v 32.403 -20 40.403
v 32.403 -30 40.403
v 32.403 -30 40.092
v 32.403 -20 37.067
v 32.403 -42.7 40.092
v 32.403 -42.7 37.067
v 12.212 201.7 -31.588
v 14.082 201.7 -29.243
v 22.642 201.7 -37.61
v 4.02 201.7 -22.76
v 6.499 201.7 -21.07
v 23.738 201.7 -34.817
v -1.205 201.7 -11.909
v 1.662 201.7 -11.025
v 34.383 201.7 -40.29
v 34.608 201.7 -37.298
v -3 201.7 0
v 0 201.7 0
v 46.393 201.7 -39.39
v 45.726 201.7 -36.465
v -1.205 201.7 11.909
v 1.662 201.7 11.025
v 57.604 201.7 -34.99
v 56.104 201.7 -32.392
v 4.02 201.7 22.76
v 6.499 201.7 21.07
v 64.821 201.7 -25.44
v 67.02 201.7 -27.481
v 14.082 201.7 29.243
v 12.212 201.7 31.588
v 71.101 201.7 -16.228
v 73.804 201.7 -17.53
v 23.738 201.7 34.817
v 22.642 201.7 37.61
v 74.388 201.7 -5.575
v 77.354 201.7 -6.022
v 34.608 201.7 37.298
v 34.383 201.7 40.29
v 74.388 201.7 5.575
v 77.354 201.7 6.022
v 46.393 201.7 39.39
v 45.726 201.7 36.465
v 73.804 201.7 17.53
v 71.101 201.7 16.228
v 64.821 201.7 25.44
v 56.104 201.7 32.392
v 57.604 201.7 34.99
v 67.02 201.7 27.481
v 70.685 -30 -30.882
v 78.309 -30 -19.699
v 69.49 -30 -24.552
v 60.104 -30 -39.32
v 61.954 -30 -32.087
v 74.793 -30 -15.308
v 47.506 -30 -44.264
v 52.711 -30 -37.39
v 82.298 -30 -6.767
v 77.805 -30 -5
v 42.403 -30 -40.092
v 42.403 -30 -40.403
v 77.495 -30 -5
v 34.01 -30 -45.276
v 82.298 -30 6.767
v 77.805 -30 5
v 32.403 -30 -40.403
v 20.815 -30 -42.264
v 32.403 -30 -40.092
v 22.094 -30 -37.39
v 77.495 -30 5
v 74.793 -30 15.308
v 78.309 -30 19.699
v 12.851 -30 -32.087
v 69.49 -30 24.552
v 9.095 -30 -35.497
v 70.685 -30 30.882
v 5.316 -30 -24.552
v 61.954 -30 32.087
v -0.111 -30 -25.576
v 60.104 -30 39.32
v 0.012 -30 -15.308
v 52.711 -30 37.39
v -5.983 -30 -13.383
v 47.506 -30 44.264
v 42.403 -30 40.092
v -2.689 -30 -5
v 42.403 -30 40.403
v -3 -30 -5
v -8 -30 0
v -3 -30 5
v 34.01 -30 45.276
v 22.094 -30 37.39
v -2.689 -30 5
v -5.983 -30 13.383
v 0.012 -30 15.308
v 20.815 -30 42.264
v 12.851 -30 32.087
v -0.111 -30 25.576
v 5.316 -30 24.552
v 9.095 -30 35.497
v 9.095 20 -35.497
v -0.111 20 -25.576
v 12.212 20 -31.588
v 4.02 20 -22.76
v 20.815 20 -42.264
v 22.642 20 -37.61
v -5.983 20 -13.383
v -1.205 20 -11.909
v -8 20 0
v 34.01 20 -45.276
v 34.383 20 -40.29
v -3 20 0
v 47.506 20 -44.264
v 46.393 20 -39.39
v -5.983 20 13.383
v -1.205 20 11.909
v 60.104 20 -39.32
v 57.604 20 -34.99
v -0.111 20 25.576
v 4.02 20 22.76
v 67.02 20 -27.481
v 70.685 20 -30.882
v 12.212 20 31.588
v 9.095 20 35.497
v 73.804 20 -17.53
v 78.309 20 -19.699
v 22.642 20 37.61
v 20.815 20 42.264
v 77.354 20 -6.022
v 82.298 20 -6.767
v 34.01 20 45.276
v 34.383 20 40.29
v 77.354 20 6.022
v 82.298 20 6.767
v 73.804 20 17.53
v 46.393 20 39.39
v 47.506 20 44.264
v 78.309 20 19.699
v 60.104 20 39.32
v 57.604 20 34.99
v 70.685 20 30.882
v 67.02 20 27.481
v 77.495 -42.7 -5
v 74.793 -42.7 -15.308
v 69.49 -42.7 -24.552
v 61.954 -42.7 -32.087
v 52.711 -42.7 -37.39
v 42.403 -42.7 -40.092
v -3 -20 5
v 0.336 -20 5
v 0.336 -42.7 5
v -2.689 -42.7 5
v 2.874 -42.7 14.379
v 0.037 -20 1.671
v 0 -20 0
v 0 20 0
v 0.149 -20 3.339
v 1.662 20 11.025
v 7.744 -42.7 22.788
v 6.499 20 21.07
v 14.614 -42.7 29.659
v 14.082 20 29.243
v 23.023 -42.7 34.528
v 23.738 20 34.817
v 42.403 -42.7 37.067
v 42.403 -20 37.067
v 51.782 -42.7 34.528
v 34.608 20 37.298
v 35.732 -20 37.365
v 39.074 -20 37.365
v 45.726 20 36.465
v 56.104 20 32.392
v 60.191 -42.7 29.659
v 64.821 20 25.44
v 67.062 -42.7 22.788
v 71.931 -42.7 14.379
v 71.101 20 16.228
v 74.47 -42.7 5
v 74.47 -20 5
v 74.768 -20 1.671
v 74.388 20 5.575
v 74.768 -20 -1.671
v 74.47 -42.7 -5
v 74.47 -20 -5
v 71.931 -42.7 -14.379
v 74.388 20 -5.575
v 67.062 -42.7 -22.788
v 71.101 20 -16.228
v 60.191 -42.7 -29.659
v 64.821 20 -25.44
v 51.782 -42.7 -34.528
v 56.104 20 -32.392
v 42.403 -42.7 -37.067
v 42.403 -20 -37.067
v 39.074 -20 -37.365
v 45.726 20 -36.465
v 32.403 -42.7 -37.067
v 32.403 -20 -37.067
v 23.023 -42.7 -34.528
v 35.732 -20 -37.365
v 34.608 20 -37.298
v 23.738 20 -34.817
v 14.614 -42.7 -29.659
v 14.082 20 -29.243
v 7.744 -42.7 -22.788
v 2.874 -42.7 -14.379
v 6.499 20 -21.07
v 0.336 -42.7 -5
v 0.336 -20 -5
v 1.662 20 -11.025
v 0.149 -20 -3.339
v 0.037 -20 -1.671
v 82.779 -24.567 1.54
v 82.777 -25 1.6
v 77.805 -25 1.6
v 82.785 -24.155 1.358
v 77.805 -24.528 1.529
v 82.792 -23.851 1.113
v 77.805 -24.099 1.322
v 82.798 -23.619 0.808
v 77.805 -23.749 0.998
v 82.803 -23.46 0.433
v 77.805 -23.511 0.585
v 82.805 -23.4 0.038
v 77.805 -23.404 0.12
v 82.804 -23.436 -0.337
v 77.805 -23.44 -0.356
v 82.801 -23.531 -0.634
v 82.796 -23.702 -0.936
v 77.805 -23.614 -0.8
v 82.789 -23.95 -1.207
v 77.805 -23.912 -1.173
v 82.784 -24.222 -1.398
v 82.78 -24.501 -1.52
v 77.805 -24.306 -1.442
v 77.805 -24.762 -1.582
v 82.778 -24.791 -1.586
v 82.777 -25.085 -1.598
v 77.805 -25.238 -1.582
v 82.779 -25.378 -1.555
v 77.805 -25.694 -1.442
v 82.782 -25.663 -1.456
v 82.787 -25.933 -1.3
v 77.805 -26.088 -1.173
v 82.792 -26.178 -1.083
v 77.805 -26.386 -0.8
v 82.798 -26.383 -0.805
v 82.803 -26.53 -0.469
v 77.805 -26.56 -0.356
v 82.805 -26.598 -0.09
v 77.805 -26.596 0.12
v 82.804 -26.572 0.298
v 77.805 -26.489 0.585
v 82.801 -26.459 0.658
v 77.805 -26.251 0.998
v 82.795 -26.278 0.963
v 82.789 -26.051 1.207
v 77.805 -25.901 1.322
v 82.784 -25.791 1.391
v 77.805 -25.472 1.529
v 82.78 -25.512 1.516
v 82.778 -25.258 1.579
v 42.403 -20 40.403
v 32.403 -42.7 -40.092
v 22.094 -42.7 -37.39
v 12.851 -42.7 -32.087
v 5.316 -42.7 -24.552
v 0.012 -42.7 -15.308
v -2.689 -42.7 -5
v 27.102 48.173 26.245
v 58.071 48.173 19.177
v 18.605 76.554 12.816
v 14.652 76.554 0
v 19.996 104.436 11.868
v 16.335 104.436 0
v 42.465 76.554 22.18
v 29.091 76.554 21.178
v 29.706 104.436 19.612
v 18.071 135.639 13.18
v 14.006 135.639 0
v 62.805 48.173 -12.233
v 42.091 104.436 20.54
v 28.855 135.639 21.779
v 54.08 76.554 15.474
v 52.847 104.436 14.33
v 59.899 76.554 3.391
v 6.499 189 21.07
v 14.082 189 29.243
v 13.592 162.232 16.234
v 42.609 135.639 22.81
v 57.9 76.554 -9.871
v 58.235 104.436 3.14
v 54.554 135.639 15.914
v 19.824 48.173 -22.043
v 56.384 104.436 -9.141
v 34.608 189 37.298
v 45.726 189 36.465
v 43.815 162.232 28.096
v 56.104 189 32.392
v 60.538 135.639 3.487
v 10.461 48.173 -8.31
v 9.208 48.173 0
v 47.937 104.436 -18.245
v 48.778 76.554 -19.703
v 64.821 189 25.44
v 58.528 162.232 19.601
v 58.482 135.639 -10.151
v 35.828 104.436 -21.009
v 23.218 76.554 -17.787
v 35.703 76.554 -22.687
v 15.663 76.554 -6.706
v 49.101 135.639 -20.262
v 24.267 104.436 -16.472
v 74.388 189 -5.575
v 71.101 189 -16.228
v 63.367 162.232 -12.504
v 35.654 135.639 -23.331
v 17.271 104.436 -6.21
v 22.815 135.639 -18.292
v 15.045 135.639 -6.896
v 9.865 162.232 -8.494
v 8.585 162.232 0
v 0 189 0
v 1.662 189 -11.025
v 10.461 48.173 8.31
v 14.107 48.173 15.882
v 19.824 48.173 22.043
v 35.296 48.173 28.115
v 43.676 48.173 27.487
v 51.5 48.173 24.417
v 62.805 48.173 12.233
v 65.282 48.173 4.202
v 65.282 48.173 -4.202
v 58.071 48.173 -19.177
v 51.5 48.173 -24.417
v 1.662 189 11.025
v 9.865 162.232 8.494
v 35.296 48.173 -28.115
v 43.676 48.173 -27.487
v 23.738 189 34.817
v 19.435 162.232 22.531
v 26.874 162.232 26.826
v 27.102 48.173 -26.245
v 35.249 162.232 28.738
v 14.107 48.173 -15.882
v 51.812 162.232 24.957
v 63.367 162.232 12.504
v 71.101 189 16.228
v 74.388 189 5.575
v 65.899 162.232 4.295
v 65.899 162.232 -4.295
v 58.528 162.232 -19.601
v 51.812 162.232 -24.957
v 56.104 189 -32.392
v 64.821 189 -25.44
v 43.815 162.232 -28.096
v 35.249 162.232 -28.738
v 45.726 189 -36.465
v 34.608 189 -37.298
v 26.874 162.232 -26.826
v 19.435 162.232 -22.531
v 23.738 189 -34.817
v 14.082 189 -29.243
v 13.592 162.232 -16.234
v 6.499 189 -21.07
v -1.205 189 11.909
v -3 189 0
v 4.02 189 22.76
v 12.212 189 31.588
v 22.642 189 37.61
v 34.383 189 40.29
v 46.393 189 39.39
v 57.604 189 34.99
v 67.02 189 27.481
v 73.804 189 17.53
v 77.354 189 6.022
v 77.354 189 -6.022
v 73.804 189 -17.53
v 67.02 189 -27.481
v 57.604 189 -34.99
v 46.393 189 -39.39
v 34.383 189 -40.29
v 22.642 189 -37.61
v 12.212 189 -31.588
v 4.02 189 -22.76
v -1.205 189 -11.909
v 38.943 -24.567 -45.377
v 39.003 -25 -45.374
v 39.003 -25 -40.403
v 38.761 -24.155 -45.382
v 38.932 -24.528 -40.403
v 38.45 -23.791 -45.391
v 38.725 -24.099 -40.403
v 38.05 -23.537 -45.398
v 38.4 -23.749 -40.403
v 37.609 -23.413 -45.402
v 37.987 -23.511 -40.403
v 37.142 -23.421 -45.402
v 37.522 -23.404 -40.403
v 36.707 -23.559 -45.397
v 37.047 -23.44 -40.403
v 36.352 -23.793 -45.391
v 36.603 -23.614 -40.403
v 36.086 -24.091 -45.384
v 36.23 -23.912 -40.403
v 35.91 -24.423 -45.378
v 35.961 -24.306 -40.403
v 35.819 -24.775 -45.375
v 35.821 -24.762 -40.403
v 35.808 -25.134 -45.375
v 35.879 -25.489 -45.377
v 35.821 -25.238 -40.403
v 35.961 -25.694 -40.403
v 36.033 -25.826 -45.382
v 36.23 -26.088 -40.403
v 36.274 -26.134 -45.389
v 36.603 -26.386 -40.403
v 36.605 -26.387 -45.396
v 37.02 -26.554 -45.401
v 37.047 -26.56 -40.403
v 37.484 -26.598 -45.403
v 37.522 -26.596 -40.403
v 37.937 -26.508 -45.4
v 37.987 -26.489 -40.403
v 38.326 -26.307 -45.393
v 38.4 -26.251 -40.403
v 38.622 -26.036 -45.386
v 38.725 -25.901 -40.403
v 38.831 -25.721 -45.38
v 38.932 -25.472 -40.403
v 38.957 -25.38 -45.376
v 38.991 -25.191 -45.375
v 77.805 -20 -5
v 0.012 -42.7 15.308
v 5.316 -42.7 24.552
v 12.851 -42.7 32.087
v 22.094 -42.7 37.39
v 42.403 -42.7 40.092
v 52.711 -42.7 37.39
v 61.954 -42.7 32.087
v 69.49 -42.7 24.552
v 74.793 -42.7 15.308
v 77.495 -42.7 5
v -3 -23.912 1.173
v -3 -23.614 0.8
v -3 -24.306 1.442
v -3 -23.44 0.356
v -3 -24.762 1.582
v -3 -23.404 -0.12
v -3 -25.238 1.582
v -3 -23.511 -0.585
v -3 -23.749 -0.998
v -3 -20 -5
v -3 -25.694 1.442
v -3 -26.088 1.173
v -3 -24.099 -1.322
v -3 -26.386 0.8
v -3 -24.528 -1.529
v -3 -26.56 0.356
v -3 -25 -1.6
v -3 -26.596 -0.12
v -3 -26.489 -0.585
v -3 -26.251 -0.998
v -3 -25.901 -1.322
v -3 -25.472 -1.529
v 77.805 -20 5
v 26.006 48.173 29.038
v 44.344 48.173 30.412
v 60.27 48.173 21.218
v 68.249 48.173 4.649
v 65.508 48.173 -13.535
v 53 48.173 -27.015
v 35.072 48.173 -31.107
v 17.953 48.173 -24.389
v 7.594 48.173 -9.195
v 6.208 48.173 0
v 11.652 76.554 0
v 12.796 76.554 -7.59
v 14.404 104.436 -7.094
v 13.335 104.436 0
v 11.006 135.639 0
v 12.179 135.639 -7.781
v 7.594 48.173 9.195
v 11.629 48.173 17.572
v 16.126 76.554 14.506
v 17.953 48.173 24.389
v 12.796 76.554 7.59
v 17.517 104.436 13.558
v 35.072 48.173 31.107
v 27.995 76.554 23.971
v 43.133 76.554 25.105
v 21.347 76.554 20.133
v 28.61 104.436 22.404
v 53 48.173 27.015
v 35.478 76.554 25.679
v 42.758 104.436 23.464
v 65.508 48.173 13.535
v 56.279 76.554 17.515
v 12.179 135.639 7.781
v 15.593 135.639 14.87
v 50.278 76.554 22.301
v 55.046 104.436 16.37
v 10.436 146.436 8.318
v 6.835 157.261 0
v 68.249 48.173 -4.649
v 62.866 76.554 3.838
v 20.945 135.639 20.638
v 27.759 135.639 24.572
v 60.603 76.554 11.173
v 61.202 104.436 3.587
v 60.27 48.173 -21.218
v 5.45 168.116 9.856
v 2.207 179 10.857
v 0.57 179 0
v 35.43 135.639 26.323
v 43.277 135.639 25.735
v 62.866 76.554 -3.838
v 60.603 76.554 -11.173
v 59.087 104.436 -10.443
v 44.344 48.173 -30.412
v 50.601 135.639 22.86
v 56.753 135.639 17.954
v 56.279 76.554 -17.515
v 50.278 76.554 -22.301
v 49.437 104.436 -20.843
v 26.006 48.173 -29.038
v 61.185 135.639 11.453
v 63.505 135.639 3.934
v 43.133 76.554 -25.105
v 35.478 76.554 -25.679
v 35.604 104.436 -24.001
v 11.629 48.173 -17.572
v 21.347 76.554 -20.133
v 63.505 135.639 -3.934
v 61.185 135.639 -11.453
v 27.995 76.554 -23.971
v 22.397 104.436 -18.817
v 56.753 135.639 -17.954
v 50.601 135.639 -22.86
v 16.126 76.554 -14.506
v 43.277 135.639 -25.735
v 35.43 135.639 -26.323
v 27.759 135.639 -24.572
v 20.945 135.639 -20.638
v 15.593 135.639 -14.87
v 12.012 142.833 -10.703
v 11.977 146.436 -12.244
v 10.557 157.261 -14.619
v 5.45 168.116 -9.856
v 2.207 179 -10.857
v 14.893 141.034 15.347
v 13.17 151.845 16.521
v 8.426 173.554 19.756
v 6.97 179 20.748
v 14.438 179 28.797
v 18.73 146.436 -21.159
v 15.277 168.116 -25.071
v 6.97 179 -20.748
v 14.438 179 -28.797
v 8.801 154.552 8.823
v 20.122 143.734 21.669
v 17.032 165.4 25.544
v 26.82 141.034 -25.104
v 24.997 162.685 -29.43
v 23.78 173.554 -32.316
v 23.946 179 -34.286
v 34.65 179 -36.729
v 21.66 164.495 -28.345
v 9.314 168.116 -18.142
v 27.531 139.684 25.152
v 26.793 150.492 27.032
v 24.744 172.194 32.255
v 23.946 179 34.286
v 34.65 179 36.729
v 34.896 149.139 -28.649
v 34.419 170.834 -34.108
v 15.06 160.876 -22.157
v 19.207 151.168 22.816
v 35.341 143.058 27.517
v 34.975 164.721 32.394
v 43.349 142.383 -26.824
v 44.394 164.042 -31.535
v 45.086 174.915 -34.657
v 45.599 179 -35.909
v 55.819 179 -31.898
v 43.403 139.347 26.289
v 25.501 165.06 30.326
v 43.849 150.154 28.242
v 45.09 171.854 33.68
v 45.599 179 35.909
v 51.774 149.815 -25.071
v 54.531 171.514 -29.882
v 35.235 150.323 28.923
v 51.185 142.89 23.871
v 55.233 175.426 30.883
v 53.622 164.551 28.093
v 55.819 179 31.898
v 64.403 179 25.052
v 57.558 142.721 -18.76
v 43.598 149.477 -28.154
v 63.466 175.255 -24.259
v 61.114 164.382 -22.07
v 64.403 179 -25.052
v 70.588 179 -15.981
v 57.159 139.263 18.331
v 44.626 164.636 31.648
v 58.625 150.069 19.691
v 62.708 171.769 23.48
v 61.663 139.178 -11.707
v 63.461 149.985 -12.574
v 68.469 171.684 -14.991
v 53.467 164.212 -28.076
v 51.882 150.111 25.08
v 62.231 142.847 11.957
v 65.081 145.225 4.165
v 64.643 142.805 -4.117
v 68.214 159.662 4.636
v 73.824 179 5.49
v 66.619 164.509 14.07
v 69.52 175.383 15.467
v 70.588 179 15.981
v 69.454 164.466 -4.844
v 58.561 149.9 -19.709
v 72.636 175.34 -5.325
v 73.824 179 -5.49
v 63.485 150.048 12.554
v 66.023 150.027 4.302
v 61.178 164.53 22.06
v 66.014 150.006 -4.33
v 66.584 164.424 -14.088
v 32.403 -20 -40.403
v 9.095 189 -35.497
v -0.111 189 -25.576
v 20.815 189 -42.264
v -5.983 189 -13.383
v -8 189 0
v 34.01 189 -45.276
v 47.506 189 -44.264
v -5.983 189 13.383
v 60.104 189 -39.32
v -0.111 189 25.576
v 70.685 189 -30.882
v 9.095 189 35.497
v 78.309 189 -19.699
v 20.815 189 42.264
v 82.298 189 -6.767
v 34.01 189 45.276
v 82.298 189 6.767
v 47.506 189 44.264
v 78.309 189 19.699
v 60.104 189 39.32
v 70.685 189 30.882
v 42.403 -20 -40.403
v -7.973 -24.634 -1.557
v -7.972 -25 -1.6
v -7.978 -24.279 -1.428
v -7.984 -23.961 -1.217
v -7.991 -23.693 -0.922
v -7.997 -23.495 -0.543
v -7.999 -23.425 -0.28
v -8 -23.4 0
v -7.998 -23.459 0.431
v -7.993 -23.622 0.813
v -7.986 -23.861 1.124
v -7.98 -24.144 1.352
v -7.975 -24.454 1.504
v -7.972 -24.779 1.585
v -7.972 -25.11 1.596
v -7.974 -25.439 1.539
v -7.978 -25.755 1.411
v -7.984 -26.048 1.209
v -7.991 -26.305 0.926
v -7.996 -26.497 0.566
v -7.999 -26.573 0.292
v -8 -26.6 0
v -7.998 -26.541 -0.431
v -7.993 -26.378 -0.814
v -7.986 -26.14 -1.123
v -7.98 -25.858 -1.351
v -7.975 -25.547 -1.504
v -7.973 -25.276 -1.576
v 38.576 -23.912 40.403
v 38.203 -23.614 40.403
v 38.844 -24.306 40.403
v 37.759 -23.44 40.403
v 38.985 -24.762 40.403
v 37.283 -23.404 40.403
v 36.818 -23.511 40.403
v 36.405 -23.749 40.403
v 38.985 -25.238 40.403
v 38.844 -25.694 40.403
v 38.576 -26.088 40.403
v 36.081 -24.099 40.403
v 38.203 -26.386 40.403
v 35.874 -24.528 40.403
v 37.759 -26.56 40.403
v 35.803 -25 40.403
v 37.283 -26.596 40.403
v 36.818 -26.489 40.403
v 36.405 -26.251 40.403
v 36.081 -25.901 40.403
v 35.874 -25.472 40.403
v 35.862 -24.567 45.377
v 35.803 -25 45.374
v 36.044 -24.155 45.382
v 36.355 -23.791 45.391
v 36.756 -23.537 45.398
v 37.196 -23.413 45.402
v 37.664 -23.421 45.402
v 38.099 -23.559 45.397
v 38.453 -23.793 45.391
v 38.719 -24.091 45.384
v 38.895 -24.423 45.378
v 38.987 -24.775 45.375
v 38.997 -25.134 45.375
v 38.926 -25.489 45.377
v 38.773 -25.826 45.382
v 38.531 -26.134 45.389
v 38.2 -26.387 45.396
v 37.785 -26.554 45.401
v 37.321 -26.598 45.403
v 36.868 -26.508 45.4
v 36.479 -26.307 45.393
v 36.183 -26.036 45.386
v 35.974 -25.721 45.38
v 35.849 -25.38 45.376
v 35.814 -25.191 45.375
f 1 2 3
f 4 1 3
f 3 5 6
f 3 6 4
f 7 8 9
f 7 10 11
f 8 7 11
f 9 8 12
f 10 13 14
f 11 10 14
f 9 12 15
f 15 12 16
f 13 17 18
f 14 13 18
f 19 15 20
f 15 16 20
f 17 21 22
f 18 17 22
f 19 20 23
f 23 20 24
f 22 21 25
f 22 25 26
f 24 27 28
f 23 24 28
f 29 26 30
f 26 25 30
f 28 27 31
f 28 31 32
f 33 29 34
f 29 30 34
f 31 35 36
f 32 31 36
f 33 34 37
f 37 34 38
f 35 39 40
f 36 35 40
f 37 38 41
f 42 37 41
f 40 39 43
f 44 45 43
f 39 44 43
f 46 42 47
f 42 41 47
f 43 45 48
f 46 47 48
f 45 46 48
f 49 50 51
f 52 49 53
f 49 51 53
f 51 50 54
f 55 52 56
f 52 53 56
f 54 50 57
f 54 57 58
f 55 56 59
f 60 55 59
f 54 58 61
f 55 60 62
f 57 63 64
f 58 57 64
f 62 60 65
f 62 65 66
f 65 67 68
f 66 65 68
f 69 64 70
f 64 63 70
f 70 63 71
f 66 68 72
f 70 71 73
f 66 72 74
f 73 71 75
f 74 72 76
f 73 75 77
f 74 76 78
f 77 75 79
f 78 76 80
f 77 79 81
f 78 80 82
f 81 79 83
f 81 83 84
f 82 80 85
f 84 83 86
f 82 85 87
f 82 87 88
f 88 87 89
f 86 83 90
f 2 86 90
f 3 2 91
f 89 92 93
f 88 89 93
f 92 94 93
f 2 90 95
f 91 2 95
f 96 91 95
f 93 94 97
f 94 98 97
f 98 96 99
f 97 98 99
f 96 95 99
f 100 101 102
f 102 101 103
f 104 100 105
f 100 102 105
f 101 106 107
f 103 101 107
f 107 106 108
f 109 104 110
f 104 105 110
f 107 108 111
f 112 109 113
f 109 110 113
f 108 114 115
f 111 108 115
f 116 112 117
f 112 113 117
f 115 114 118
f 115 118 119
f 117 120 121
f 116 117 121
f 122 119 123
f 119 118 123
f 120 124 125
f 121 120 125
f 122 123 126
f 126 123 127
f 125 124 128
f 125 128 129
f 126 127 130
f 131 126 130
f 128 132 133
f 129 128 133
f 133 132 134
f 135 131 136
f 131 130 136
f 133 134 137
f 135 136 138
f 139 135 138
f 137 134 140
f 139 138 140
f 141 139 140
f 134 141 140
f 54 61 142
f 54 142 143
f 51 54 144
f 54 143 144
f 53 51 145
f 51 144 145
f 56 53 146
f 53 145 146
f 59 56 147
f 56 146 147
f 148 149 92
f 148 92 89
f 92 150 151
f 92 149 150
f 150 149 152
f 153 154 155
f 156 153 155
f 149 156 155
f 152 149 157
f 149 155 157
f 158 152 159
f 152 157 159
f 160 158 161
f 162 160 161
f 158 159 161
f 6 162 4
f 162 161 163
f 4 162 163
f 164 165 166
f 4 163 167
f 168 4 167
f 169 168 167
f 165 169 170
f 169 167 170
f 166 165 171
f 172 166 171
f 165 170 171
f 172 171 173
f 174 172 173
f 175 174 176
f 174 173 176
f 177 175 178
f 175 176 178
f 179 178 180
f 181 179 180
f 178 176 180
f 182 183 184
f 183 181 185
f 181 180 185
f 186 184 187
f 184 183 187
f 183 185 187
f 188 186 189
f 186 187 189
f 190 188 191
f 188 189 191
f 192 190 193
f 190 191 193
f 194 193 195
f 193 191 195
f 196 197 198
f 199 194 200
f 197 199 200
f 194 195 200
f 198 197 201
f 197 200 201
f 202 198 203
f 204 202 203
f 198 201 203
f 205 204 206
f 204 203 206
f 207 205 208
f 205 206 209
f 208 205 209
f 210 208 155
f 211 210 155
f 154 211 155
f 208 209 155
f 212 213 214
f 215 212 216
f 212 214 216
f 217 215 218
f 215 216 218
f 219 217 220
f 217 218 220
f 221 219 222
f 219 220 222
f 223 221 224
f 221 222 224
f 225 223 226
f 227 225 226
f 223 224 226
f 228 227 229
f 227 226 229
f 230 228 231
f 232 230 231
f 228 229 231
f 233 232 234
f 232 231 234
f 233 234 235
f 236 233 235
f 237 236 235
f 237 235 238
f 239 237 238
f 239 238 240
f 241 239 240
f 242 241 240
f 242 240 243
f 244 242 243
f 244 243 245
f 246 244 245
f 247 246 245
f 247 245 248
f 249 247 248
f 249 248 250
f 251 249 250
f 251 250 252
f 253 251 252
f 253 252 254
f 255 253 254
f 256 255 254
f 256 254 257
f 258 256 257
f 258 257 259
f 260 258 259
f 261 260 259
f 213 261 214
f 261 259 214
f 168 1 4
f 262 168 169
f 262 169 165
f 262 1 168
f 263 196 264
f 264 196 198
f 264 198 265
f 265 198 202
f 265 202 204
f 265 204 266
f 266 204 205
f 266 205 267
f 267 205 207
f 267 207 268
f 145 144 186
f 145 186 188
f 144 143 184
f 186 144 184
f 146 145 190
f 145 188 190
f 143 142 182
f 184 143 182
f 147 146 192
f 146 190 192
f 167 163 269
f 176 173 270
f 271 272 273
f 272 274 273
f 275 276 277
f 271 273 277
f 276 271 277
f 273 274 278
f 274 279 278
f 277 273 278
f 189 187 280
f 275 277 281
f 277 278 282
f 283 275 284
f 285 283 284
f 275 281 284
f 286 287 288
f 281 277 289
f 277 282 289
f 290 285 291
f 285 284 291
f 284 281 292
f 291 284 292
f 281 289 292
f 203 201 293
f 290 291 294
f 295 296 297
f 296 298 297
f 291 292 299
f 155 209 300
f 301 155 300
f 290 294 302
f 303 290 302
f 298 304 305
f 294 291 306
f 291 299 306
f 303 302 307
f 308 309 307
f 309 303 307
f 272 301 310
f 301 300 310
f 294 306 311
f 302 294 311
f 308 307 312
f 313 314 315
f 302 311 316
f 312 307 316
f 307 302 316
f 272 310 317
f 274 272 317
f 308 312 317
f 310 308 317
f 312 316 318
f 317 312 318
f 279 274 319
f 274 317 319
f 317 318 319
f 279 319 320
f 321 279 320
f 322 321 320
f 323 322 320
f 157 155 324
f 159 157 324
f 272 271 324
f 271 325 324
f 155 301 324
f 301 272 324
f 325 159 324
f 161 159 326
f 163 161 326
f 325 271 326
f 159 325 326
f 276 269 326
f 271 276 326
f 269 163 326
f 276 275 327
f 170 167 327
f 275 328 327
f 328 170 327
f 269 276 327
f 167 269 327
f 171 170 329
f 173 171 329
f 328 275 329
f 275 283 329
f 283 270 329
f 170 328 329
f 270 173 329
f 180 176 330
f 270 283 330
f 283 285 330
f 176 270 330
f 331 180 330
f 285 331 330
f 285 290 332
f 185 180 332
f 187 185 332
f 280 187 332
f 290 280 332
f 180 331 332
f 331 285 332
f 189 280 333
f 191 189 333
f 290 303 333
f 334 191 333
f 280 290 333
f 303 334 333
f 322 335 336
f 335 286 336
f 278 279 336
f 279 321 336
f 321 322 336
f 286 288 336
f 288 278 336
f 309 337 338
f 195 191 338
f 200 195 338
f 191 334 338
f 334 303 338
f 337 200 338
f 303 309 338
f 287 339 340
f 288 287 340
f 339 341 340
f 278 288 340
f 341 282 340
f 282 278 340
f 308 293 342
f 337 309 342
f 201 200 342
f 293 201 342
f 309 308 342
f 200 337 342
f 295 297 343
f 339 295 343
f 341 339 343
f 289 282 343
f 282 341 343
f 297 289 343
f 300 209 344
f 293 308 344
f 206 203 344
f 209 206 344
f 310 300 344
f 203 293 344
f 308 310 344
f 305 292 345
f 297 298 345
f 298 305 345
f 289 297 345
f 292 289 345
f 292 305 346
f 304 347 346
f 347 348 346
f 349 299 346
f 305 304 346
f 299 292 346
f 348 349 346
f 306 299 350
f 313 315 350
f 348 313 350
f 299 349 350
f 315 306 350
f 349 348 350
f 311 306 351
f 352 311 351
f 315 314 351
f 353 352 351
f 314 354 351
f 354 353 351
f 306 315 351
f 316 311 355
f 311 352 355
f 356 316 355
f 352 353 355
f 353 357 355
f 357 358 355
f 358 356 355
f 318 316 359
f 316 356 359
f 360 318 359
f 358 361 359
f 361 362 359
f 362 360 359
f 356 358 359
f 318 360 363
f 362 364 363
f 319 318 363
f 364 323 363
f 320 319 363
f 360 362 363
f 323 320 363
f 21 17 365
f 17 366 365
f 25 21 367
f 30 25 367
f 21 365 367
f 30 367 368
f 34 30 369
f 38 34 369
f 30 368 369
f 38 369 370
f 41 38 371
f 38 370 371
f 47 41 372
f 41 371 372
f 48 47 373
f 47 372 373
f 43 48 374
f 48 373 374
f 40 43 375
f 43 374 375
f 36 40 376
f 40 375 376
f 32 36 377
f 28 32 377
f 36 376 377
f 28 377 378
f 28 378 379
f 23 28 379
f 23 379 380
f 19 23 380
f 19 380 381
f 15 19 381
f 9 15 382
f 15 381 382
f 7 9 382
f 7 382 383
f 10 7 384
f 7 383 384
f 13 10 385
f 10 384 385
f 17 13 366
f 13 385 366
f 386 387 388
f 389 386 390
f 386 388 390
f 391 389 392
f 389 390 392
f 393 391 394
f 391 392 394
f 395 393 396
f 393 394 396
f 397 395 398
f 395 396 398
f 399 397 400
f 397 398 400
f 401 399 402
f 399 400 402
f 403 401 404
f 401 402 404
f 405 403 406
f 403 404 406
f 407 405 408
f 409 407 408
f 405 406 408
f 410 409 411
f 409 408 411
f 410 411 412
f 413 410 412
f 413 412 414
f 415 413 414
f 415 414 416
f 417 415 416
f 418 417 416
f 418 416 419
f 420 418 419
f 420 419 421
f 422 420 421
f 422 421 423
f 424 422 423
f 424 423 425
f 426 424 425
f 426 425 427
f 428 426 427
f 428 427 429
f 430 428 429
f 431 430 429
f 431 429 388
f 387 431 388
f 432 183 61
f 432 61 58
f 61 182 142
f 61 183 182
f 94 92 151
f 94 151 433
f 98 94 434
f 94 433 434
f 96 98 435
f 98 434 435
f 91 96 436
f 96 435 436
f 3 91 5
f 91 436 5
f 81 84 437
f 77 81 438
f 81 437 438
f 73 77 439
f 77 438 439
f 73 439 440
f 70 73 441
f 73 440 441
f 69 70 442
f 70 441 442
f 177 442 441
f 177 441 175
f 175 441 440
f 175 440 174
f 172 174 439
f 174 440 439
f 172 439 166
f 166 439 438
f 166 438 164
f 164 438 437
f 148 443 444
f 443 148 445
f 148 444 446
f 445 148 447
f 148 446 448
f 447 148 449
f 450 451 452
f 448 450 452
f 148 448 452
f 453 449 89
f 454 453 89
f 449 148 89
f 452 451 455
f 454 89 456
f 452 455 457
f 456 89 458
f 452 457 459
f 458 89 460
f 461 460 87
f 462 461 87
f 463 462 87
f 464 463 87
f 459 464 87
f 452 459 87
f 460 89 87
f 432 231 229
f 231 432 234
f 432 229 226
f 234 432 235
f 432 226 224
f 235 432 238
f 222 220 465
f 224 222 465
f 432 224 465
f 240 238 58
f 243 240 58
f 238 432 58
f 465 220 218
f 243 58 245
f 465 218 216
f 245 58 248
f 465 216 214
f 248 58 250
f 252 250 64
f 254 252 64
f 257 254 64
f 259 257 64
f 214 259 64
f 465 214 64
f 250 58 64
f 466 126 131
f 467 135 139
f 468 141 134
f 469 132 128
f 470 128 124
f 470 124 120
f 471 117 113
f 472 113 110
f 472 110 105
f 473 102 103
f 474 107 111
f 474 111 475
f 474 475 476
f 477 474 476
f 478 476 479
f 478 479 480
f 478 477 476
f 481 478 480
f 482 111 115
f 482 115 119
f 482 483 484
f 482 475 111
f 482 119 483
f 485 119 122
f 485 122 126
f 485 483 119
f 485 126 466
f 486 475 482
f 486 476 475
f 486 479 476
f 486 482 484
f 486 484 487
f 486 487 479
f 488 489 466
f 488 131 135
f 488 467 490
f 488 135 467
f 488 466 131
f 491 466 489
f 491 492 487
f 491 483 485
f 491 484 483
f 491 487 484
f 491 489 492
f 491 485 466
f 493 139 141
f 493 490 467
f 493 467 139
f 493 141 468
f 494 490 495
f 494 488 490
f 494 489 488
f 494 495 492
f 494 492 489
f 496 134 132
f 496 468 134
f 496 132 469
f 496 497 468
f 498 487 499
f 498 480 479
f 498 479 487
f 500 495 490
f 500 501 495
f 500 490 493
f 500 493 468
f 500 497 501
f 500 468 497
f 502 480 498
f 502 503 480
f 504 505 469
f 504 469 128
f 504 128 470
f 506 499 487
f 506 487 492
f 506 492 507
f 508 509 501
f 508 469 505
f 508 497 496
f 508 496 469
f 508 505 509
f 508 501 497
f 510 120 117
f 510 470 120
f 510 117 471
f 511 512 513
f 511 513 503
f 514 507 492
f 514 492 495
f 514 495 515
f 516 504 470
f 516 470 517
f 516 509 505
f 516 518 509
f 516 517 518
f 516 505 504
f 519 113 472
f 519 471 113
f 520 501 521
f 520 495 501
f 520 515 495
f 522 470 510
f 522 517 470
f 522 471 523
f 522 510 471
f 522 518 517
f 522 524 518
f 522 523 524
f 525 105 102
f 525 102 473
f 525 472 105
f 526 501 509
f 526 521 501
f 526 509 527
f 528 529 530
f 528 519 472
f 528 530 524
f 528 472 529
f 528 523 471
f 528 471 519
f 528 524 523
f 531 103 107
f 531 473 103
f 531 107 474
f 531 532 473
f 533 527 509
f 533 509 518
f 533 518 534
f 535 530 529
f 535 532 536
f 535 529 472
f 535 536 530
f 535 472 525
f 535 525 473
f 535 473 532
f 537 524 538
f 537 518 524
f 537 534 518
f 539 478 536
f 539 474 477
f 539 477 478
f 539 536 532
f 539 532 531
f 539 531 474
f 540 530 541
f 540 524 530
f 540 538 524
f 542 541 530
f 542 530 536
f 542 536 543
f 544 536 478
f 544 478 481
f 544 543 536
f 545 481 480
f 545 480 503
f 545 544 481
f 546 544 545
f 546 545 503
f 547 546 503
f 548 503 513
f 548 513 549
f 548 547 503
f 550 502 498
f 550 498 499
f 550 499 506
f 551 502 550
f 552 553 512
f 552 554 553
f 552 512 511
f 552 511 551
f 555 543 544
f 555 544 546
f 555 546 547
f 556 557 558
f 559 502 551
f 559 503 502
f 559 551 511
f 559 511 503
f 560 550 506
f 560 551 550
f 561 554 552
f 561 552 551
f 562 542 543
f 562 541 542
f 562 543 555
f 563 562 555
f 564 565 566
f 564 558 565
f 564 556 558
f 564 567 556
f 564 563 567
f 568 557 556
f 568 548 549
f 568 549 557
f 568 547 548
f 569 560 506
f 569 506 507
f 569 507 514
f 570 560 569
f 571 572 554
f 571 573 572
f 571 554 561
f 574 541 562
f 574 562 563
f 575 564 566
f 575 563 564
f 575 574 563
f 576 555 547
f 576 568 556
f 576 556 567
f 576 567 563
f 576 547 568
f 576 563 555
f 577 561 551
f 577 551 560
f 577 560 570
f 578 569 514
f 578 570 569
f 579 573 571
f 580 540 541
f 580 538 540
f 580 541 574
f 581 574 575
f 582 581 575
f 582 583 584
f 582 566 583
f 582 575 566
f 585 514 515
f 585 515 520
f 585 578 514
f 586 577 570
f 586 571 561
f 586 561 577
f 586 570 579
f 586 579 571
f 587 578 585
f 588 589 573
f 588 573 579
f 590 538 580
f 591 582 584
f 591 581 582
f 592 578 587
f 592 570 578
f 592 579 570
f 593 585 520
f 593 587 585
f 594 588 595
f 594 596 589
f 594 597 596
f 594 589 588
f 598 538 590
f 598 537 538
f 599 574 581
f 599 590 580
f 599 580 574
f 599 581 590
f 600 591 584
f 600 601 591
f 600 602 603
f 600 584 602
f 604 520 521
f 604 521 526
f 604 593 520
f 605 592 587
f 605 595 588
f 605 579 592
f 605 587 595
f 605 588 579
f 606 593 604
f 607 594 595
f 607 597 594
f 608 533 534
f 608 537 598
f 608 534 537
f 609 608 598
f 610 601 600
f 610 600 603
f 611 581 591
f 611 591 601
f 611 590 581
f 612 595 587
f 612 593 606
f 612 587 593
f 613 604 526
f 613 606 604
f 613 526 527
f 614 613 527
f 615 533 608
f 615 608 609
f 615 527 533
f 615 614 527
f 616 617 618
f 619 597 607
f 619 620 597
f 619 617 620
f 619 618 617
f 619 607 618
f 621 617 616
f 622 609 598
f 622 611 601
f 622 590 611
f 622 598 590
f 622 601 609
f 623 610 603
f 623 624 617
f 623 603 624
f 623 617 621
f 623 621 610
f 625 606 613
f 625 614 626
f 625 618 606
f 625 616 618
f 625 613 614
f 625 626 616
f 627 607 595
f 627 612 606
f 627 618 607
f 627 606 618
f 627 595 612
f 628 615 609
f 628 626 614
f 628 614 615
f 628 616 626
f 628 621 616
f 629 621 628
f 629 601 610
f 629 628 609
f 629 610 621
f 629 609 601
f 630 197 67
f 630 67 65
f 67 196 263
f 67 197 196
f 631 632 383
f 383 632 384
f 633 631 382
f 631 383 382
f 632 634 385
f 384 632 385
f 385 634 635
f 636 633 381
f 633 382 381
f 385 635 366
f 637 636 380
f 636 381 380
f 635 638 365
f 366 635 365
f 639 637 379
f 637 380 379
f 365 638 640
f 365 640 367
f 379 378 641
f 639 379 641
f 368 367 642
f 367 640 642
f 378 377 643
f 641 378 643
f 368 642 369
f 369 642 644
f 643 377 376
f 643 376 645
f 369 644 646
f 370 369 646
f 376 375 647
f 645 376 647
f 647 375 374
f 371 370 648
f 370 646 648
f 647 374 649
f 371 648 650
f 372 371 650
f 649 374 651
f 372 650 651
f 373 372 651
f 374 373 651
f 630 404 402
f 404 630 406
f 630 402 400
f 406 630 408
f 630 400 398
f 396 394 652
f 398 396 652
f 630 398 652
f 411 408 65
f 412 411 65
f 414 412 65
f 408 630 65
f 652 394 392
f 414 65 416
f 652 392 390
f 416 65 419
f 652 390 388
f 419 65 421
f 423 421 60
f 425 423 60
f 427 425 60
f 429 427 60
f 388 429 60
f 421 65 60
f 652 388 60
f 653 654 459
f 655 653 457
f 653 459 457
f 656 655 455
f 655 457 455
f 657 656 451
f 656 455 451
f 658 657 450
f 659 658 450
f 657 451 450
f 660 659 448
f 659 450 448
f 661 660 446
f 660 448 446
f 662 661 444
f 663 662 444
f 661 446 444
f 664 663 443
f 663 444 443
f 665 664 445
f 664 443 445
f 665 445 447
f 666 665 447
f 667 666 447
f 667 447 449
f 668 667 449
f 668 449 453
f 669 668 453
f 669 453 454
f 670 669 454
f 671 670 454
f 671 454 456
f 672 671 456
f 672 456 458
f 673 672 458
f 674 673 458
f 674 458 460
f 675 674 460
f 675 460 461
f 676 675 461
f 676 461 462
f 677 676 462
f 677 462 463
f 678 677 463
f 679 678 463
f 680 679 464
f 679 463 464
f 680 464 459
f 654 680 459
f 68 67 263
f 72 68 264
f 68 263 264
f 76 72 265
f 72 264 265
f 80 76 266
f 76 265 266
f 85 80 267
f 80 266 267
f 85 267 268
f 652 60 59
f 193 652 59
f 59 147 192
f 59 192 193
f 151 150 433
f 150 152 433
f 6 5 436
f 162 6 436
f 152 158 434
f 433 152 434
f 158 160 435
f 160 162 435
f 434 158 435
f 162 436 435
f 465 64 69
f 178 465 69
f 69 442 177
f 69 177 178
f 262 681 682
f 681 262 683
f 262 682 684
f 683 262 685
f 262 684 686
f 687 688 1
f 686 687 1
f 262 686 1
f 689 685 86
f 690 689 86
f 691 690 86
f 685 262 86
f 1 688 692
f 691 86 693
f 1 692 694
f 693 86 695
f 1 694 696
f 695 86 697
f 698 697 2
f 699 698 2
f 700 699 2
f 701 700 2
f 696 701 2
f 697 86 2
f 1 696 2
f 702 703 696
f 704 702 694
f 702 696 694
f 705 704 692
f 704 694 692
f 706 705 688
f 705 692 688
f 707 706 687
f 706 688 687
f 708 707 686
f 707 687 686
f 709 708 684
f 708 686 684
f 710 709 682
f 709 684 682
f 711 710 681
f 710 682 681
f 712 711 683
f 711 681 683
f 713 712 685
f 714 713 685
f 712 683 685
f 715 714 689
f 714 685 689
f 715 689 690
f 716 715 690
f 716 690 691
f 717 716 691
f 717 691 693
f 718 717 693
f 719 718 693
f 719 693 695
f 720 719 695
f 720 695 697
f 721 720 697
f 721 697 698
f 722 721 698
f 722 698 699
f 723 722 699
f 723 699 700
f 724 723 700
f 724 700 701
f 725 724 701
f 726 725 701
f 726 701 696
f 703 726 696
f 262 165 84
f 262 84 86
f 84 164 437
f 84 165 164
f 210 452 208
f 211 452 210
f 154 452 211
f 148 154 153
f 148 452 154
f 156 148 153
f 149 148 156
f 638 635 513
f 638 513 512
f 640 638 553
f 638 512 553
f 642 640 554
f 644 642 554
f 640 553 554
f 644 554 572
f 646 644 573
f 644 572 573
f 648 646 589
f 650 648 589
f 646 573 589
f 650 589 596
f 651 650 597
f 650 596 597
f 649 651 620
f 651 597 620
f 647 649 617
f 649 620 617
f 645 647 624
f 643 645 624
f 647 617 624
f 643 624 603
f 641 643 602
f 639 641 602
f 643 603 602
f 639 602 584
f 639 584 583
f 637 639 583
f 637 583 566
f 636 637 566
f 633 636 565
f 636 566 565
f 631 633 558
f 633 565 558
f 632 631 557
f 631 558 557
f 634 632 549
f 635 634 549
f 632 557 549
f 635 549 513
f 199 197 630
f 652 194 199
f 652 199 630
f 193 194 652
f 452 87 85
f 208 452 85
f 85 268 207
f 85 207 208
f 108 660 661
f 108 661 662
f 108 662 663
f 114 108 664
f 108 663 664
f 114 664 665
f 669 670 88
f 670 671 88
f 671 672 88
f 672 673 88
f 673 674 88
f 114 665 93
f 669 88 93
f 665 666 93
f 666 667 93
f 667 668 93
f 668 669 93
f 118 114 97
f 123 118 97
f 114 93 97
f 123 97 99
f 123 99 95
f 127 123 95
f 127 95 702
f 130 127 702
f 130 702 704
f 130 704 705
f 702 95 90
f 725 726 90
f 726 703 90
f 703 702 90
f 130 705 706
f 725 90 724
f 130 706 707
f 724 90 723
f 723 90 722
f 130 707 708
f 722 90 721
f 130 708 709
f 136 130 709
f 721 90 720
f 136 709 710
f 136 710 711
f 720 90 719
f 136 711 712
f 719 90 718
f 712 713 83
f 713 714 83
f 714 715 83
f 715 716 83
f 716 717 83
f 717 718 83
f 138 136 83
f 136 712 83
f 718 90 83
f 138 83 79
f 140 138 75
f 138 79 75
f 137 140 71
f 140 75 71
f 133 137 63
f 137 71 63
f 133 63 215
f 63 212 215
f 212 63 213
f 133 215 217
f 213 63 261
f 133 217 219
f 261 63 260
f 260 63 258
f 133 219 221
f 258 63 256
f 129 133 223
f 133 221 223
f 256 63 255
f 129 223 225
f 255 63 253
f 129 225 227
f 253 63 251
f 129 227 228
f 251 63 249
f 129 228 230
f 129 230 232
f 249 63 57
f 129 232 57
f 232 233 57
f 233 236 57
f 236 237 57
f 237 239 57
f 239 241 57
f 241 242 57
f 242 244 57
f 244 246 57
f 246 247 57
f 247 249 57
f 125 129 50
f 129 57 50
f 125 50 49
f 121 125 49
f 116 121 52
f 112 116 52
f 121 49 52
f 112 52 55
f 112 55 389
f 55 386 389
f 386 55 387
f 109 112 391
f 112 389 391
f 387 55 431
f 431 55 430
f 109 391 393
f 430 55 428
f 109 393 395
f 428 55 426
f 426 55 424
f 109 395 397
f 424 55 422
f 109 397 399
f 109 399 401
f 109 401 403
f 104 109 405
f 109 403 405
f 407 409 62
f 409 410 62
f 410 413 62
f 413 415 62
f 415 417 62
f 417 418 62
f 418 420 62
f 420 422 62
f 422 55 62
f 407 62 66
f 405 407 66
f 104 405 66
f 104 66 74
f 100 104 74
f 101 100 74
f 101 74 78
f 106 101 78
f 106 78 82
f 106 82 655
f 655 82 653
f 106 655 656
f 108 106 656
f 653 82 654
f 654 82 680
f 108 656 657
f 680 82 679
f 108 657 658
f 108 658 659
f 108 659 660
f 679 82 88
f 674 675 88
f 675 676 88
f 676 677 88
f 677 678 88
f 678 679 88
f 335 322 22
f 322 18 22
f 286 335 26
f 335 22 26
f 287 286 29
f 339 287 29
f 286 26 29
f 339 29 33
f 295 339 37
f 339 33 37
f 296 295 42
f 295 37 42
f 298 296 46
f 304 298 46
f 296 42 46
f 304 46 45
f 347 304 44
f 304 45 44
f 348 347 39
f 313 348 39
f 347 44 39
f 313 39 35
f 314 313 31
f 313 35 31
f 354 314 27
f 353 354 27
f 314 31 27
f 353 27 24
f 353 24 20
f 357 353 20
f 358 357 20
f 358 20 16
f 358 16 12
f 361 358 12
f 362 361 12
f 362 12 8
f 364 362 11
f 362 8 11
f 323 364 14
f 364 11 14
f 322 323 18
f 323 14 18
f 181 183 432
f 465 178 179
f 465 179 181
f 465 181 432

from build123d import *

# Parameters (mm, degrees)
CUT_EXTRUDE1_DEPTH = 22.7
SKETCH3_R          = 1.6
CUT_EXTRUDE2_DEPTH = 6
CIRPATTERN1_COUNT  = 4


with BuildPart() as part:
    # Sketch1 → Revolve1 (revolve)
    with BuildSketch(Plane.XY):
        with BuildLine():
            Line((0, 188.999977867), (0, 201.699977867))
            Line((0, 201.699977867), (-3, 201.699977867))
            Line((-3, 201.699977867), (-3, 188.999977867))
            Line((-3, 188.999977867), (-8, 188.999977867))
            Line((-8, 188.999977867), (0.570207018, 178.999977867))
            add(Edge.make_bspline(
                [(-3, 19.999977867), (17.518474446, 71.927932429), (18.708543453, 124.927932429), (0.570207018, 178.999977867)],
                knots=[0, 0, 0, 0, 0.942000122, 0.942000122, 0.942000122, 0.942000122], degree=3))
            Line((-3, 19.999977867), (-8, 19.999977867))
            Line((-8, 19.999977867), (-8, -30.000022133))
            Line((-8, -30.000022133), (-3, -30.000022133))
            Line((-3, -30.000022133), (-3, -42.700022133))
            Line((-3, -42.700022133), (0, -42.700022133))
            Line((0, -42.700022133), (0, -30.000022133))
            Line((0, -30.000022133), (0, 20.000038989))
            add(Edge.make_bspline(
                [(0, 20.000038989), (32.67273479, 102.687818928), (0, 188.999977867)],
                knots=[0, 0, 0, 1, 1, 1], degree=2))
        make_face()
    revolve(axis=Axis((37.402673701, -40.000005834, 0), (0, 1, 0)))

    # Sketch2 → Cut-Extrude1 (cut)
    with BuildSketch(Plane.XZ.offset(42.700022133)):
        with BuildLine():
            Line((25.405862227, 5), (-3, 5))
            Line((-3, 5), (-3, -5))
            Line((-3, -5), (25.405862227, -5))
            ThreePointArc((25.405862227, -5), (28.2123667, -9.190307001), (32.402673701, -11.996811474))
            Line((32.402673701, -11.996811474), (32.402673701, -40.402673701))
            Line((32.402673701, -40.402673701), (42.402673701, -40.402673701))
            Line((42.402673701, -40.402673701), (42.402673701, -11.996811474))
            ThreePointArc((42.402673701, -11.996811474), (46.592980702, -9.190307001), (49.399485175, -5))
            Line((49.399485175, -5), (77.805347402, -5))
            Line((77.805347402, -5), (77.805347402, 5))
            Line((77.805347402, 5), (49.399485175, 5))
            ThreePointArc((49.399485175, 5), (46.592980702, 9.190307001), (42.402673701, 11.996811474))
            Line((42.402673701, 11.996811474), (42.402673701, 40.402673701))
            Line((42.402673701, 40.402673701), (32.402673701, 40.402673701))
            Line((32.402673701, 40.402673701), (32.402673701, 11.996811474))
            ThreePointArc((32.402673701, 11.996811474), (28.2123667, 9.190307001), (25.405862227, 5))
        make_face()
    extrude(amount=-CUT_EXTRUDE1_DEPTH, mode=Mode.SUBTRACT)

    # Sketch3 → Cut-Extrude2 (cut, through all)
    with BuildSketch(Plane(origin=(-3, 0, 0), x_dir=(0, 0, -1), z_dir=(1, 0, 0))):
        with Locations((0, -25.000022133)):
            Circle(SKETCH3_R)
    cut_extrude2 = extrude(amount=-CUT_EXTRUDE2_DEPTH, mode=Mode.SUBTRACT)

    # CirPattern1: Cut-Extrude2 ×4 about axis
    cirpattern1_axis = Axis((37.402673701, 20.000038989, 0), (0, -1, 0))
    for i in range(1, CIRPATTERN1_COUNT):
        add(cut_extrude2.rotate(cirpattern1_axis, i * 360 / CIRPATTERN1_COUNT), mode=Mode.SUBTRACT)


solid = part.part
